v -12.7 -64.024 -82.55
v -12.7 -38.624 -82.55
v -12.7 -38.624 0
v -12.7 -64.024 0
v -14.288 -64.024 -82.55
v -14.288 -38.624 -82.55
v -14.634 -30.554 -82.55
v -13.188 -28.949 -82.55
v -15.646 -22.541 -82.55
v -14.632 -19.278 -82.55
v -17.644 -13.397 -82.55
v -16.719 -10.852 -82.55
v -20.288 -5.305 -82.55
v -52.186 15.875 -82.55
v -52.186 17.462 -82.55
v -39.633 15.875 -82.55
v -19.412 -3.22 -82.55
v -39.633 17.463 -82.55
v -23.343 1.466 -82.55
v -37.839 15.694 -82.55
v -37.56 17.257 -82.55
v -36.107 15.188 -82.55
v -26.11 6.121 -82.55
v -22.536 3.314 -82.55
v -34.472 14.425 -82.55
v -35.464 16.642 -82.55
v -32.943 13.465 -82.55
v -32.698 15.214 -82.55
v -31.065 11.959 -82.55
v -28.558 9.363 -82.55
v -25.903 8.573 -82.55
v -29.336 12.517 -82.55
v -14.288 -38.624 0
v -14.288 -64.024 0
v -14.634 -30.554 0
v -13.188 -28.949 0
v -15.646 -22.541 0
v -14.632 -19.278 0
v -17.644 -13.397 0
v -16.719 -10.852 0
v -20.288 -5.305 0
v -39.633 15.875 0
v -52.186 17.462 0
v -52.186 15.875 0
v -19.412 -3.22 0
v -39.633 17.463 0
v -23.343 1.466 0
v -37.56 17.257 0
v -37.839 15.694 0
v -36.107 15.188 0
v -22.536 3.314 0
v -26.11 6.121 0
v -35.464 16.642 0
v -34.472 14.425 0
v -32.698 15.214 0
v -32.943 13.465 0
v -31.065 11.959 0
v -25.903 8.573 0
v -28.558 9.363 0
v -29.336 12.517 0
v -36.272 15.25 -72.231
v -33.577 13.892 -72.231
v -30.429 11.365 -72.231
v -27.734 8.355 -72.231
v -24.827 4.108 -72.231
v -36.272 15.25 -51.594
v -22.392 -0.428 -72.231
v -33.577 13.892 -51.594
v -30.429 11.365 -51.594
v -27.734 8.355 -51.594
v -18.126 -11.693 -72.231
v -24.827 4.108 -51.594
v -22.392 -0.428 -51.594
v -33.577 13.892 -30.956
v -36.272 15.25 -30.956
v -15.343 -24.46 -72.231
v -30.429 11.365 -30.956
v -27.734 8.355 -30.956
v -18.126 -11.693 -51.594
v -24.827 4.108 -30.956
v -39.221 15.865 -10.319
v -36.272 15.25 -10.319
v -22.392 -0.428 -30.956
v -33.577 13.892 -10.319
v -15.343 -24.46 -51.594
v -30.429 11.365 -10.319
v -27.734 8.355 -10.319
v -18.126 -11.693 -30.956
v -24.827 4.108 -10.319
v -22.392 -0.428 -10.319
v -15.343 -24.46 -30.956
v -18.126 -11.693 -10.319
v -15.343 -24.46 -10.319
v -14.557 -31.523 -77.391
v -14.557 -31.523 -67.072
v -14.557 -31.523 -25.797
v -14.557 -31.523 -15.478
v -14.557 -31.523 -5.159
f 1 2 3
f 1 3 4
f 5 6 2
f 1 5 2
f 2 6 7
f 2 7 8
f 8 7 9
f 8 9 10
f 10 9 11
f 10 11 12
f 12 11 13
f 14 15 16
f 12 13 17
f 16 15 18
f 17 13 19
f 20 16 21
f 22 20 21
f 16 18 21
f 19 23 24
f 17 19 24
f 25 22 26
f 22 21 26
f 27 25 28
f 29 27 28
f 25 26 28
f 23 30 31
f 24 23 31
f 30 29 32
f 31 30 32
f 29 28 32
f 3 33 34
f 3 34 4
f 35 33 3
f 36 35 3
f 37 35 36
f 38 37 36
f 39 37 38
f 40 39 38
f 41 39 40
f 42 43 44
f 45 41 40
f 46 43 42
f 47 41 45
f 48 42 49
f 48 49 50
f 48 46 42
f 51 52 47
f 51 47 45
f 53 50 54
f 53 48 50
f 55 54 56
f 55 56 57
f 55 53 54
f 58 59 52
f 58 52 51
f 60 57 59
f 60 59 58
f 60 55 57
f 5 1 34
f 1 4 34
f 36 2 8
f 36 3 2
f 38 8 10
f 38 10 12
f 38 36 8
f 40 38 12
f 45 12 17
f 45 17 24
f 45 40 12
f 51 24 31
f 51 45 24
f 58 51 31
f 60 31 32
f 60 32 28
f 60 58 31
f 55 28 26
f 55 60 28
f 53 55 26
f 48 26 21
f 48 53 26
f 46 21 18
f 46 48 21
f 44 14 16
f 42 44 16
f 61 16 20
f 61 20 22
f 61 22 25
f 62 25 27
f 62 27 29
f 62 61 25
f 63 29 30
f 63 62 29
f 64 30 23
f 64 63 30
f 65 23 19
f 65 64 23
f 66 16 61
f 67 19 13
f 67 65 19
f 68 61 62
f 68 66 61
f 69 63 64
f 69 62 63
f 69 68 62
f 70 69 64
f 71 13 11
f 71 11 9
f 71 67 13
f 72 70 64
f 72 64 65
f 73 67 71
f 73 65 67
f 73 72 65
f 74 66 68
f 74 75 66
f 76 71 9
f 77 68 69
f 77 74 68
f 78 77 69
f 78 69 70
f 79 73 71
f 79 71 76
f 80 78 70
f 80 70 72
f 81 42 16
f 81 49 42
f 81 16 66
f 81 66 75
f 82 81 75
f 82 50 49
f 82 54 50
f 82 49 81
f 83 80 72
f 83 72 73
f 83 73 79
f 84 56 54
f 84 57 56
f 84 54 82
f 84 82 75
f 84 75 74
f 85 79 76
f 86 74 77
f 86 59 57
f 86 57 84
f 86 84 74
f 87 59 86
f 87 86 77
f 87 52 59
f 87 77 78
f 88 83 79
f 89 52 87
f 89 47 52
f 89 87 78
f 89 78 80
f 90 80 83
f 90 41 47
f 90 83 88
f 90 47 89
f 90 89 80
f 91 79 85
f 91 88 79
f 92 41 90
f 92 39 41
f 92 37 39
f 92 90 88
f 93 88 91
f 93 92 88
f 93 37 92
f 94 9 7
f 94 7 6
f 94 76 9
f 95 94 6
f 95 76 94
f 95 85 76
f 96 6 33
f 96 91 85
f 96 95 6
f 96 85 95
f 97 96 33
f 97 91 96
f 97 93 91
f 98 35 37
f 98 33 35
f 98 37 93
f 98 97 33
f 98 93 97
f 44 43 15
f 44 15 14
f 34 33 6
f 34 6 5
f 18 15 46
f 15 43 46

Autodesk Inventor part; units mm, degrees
ref_plane "YZ Plane" through (0, 0, 0) normal (1, 0, 0) x (0, 1, 0)
ref_plane "XZ Plane" through (0, 0, 0) normal (0, 1, 0) x (-1, 0, 0)
ref_plane "XY Plane" through (0, 0, 0) normal (0, 0, 1) x (1, 0, 0)
sketch "Sketch1" plane through (0, 0, 0) normal (0, 0, 1) x (1, 0, 0)
  line L0 (-52.1863, 17.4625) -> (-39.6331, 17.4625)
  ellipse E0 centre (-35.0357, -29.0502) end of major axis (-40.9054, 17.3827) minor radius 21.7222 (-12.7, -38.6239) -> (-39.6331, 17.4625) ccw
  line L1 (-12.7, -38.6239) -> (-12.7, -64.0239)
  line L2 (-52.1863, 15.875) -> (-39.6331, 15.875)
  line L3 (-14.2875, -38.6239) -> (-14.2875, -64.0239)
  line L4 (-52.1863, 17.4625) -> (-52.1863, 15.875)
  line L5 (-12.7, -64.0239) -> (-14.2875, -64.0239)
  spline S0 degree 5 poles (-39.6331, 15.8751) (-39.5506, 15.8751) (-39.4681, 15.8741) (-39.3857, 15.8721) (-38.0942, 15.8262) (-36.8136, 15.5443) (-35.6732, 15.1037) (-33.1533, 13.7975) (-30.9609, 11.9793) (-29.8061, 10.841) (-27.3673, 8.0794) (-25.3083, 5.0217) (-24.2528, 3.2489) (-22.1488, -0.7015) (-20.41, -4.8272) (-19.5649, -7.0886) (-17.9813, -11.8632) (-16.7471, -16.7402) (-16.1934, -19.2984) (-15.2526, -24.4756) (-14.6572, -29.7039) (-14.4448, -32.341) (-14.3123, -35.1828) (-14.2891, -38.0258) (-14.288, -38.2252) (-14.2875, -38.4245) (-14.2875, -38.6239) knots 0 0 0 0 0 0 0.006424 0.006424 0.006424 0.10063 0.10063 0.10063 0.226594 0.226594 0.226594 0.387029 0.387029 0.387029 0.574874 0.574874 0.574874 0.778571 0.778571 0.778571 0.984473 0.984473 0.984473 1 1 1 1 1 1
  point P0 (0, 0)
  dimension "d2" = 1.5875
  dimension "d1" = 25.4
extrude "Extrusion1" add sketch "Sketch1" against normal blind 82.55
properties part number "Intake hood polycarb"
